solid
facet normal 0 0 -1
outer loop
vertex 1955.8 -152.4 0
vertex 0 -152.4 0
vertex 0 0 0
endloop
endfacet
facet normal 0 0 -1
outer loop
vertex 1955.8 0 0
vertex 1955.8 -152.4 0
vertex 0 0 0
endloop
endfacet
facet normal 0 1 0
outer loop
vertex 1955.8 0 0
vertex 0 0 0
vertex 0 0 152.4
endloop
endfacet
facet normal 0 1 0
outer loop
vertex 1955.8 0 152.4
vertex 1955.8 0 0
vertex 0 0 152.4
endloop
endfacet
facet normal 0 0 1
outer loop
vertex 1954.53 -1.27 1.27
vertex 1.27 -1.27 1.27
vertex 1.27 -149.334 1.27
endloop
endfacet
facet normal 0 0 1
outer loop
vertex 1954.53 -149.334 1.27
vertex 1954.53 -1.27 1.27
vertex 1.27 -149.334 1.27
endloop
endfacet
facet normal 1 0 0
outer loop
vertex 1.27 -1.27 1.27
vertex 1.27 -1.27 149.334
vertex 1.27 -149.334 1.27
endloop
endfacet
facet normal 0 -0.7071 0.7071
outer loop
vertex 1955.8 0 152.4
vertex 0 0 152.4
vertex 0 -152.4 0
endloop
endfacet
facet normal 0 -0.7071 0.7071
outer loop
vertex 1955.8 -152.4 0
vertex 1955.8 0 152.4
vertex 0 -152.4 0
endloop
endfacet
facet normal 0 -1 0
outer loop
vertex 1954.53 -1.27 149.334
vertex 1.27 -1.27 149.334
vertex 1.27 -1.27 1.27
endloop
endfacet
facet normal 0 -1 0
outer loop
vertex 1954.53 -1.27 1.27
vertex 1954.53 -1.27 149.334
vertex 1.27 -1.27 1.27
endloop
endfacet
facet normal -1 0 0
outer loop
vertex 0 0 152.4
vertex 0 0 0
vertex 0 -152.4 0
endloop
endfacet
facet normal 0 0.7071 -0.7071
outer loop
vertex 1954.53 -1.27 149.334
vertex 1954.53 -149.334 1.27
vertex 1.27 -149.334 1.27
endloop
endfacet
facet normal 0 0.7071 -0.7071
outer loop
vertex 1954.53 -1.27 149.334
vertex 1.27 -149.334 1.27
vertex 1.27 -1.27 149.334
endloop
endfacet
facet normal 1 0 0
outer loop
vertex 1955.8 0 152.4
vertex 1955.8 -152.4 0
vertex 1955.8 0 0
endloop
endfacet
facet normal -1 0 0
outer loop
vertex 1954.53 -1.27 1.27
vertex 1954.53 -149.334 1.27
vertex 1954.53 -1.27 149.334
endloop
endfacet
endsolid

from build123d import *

# Parameters (mm, degrees)
F1_DEPTH = 1955.8
F3_DEPTH = 1.27
F5_DEPTH = 1.27


with BuildPart() as f1:
    # F0 (on Right) → F1 (new body)
    with BuildSketch(Plane.YZ):
        Polygon((-152.4, 0), (0, 0), (0, 152.4), align=None)
        Polygon((-149.333949, 1.27), (-1.27, 149.333949), (-1.27, 1.27), align=None, mode=Mode.SUBTRACT)
    extrude(amount=F1_DEPTH)

    # F2 (on face) → F3 (join)
    with BuildSketch(Plane(origin=(0, 0, 0), x_dir=(0, -1, 0), z_dir=(-1, 0, 0))):
        Polygon((1.27, 149.333949), (1.27, 1.27), (149.333949, 1.27), align=None)
    extrude(amount=-F3_DEPTH)

    # F4 (on face) → F5 (join)
    with BuildSketch(Plane.YZ.offset(1955.8)):
        Polygon((-149.333949, 1.27), (-1.27, 1.27), (-1.27, 149.333949), align=None)
    extrude(amount=-F5_DEPTH)


solid = f1.part
